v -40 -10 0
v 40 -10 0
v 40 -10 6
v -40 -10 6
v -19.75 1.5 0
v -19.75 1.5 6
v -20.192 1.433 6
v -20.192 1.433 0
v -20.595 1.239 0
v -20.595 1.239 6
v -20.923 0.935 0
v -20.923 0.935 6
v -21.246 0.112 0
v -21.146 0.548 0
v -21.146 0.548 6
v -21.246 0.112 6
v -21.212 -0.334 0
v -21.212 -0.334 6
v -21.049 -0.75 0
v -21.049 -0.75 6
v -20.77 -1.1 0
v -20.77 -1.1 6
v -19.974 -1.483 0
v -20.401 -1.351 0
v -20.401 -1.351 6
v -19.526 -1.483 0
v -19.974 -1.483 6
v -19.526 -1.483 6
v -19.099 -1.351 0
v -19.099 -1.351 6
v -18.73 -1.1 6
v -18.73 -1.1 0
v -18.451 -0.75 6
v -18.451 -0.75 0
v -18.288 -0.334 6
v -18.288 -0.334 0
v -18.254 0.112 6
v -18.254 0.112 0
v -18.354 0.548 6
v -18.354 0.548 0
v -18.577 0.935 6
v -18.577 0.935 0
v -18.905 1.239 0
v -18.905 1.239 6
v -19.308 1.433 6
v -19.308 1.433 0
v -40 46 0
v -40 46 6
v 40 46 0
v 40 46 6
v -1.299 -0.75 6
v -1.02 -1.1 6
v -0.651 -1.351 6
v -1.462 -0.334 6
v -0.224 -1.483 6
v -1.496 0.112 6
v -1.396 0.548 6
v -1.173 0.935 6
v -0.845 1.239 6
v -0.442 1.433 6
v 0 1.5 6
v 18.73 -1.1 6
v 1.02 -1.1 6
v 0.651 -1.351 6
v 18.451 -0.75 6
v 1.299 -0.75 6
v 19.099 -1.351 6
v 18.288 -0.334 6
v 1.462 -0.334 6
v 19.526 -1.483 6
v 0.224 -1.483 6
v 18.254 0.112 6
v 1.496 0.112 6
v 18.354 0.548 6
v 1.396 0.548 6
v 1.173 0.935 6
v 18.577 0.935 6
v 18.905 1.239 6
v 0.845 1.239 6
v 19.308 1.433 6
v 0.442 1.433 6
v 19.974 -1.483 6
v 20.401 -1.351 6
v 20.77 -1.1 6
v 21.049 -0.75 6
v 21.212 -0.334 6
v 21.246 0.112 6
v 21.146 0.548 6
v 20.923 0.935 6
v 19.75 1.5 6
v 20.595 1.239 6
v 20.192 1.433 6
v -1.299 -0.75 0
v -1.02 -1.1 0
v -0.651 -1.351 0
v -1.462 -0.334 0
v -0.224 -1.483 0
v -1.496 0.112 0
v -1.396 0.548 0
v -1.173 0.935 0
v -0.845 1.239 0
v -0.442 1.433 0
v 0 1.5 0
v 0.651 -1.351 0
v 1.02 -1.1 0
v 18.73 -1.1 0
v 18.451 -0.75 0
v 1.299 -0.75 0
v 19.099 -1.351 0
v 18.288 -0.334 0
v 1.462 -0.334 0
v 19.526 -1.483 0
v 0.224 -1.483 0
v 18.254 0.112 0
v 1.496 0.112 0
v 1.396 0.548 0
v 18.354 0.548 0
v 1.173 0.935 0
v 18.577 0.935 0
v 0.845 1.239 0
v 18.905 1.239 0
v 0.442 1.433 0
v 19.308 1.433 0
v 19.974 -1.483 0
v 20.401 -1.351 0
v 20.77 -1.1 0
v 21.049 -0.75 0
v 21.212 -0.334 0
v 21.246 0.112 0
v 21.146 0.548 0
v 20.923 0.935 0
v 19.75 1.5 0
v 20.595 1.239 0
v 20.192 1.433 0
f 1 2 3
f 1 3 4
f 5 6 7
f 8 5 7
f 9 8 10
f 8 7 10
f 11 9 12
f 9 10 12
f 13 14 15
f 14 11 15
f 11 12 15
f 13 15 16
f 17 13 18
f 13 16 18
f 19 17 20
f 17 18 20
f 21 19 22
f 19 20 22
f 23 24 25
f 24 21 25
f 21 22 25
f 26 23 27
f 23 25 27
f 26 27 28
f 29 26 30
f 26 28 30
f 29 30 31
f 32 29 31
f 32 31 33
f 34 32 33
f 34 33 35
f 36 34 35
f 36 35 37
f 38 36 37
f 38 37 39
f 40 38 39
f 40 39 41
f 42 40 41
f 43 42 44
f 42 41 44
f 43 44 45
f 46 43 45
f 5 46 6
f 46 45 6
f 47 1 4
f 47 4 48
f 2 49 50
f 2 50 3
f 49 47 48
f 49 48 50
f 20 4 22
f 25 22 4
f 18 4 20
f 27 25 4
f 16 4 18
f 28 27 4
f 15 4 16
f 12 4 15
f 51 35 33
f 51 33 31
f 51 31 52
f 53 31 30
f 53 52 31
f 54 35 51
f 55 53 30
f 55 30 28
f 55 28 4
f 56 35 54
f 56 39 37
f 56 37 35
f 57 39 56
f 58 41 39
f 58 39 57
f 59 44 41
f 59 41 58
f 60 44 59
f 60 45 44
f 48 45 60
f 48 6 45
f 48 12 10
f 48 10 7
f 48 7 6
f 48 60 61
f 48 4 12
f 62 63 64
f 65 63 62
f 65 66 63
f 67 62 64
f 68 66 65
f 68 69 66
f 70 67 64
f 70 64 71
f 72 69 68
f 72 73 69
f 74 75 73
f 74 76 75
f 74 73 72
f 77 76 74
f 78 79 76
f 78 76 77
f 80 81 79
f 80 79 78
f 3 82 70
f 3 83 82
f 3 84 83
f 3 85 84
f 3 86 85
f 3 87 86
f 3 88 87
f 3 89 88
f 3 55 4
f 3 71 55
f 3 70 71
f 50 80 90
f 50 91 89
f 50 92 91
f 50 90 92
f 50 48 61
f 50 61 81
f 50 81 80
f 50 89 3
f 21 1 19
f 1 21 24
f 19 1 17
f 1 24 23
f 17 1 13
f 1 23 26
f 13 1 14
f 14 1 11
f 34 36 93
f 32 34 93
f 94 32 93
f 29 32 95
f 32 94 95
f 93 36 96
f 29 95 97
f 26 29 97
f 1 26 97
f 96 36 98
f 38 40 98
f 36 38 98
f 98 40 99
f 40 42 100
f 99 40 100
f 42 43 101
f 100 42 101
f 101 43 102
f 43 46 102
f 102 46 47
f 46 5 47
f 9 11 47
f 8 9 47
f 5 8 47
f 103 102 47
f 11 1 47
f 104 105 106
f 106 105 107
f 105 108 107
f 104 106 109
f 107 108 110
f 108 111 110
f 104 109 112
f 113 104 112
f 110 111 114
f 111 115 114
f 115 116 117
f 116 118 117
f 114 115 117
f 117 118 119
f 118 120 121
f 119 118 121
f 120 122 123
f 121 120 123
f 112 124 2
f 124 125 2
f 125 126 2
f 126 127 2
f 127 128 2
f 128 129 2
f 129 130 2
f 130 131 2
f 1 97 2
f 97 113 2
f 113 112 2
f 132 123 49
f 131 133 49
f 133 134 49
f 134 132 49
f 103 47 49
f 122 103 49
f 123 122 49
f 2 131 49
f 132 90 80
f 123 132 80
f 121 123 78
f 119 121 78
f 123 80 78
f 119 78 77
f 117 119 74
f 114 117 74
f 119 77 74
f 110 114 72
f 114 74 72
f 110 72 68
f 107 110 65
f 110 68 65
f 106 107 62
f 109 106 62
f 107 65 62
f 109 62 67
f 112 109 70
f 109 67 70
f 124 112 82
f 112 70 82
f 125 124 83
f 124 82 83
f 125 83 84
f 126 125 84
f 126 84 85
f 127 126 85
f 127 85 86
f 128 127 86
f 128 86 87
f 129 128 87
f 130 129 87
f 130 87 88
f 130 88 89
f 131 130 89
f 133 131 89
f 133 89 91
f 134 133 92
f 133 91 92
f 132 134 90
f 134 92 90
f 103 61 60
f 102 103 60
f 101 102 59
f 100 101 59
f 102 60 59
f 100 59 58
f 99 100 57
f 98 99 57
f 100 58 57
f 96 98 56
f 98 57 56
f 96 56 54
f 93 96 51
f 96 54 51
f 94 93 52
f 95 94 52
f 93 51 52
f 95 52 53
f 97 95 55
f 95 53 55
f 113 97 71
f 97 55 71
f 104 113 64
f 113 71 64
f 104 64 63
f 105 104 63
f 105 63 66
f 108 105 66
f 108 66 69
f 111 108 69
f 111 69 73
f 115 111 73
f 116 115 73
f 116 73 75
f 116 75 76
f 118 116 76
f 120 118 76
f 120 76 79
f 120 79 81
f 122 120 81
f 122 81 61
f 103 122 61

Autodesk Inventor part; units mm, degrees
ref_plane "YZ Plane" through (0, 0, 0) normal (1, 0, 0) x (0, 1, 0)
ref_plane "XZ Plane" through (0, 0, 0) normal (0, 1, 0) x (-1, 0, 0)
ref_plane "XY Plane" through (0, 0, 0) normal (0, 0, 1) x (1, 0, 0)
sketch "Sketch1" plane through (0, 0, 0) normal (0, 0, 1) x (1, 0, 0)
  line L0 (0, 0) -> (0, 40)
  line L1 (0, 40) -> (0, 46)
  line L2 (0, 46) -> (40, 46)
  line L3 (40, -10) -> (0, -10)
  line L4 (0, -10) -> (0, 0)
  line L5 (40, 46) -> (40, 40)
  line L6 (40, 40) -> (40, -10)
  line L7 (0, 40) -> (40, 40) construction
  line L8 (0, 0) -> (19.75, 0) construction
  dimension "d0" = 40
  dimension "d1" = 6
  dimension "d2" = 10
  dimension "d3" = 40
  dimension "d4" = 40
  dimension "d5" = 19.75
extrude "Extrusion1" add sketch "Sketch1" along normal blind 6
fillet "Fillet1" [suppressed]
hole "Hole1" at (0, 0, 0) at (19.75, 0, 0) direction (0, 0, 1) diameter 3 end through all
mirror "Mirror1" about plane through (0, 40, 0) normal (-1, 0, 0)
properties part number "segment0a" material "Plywood, Finish"
